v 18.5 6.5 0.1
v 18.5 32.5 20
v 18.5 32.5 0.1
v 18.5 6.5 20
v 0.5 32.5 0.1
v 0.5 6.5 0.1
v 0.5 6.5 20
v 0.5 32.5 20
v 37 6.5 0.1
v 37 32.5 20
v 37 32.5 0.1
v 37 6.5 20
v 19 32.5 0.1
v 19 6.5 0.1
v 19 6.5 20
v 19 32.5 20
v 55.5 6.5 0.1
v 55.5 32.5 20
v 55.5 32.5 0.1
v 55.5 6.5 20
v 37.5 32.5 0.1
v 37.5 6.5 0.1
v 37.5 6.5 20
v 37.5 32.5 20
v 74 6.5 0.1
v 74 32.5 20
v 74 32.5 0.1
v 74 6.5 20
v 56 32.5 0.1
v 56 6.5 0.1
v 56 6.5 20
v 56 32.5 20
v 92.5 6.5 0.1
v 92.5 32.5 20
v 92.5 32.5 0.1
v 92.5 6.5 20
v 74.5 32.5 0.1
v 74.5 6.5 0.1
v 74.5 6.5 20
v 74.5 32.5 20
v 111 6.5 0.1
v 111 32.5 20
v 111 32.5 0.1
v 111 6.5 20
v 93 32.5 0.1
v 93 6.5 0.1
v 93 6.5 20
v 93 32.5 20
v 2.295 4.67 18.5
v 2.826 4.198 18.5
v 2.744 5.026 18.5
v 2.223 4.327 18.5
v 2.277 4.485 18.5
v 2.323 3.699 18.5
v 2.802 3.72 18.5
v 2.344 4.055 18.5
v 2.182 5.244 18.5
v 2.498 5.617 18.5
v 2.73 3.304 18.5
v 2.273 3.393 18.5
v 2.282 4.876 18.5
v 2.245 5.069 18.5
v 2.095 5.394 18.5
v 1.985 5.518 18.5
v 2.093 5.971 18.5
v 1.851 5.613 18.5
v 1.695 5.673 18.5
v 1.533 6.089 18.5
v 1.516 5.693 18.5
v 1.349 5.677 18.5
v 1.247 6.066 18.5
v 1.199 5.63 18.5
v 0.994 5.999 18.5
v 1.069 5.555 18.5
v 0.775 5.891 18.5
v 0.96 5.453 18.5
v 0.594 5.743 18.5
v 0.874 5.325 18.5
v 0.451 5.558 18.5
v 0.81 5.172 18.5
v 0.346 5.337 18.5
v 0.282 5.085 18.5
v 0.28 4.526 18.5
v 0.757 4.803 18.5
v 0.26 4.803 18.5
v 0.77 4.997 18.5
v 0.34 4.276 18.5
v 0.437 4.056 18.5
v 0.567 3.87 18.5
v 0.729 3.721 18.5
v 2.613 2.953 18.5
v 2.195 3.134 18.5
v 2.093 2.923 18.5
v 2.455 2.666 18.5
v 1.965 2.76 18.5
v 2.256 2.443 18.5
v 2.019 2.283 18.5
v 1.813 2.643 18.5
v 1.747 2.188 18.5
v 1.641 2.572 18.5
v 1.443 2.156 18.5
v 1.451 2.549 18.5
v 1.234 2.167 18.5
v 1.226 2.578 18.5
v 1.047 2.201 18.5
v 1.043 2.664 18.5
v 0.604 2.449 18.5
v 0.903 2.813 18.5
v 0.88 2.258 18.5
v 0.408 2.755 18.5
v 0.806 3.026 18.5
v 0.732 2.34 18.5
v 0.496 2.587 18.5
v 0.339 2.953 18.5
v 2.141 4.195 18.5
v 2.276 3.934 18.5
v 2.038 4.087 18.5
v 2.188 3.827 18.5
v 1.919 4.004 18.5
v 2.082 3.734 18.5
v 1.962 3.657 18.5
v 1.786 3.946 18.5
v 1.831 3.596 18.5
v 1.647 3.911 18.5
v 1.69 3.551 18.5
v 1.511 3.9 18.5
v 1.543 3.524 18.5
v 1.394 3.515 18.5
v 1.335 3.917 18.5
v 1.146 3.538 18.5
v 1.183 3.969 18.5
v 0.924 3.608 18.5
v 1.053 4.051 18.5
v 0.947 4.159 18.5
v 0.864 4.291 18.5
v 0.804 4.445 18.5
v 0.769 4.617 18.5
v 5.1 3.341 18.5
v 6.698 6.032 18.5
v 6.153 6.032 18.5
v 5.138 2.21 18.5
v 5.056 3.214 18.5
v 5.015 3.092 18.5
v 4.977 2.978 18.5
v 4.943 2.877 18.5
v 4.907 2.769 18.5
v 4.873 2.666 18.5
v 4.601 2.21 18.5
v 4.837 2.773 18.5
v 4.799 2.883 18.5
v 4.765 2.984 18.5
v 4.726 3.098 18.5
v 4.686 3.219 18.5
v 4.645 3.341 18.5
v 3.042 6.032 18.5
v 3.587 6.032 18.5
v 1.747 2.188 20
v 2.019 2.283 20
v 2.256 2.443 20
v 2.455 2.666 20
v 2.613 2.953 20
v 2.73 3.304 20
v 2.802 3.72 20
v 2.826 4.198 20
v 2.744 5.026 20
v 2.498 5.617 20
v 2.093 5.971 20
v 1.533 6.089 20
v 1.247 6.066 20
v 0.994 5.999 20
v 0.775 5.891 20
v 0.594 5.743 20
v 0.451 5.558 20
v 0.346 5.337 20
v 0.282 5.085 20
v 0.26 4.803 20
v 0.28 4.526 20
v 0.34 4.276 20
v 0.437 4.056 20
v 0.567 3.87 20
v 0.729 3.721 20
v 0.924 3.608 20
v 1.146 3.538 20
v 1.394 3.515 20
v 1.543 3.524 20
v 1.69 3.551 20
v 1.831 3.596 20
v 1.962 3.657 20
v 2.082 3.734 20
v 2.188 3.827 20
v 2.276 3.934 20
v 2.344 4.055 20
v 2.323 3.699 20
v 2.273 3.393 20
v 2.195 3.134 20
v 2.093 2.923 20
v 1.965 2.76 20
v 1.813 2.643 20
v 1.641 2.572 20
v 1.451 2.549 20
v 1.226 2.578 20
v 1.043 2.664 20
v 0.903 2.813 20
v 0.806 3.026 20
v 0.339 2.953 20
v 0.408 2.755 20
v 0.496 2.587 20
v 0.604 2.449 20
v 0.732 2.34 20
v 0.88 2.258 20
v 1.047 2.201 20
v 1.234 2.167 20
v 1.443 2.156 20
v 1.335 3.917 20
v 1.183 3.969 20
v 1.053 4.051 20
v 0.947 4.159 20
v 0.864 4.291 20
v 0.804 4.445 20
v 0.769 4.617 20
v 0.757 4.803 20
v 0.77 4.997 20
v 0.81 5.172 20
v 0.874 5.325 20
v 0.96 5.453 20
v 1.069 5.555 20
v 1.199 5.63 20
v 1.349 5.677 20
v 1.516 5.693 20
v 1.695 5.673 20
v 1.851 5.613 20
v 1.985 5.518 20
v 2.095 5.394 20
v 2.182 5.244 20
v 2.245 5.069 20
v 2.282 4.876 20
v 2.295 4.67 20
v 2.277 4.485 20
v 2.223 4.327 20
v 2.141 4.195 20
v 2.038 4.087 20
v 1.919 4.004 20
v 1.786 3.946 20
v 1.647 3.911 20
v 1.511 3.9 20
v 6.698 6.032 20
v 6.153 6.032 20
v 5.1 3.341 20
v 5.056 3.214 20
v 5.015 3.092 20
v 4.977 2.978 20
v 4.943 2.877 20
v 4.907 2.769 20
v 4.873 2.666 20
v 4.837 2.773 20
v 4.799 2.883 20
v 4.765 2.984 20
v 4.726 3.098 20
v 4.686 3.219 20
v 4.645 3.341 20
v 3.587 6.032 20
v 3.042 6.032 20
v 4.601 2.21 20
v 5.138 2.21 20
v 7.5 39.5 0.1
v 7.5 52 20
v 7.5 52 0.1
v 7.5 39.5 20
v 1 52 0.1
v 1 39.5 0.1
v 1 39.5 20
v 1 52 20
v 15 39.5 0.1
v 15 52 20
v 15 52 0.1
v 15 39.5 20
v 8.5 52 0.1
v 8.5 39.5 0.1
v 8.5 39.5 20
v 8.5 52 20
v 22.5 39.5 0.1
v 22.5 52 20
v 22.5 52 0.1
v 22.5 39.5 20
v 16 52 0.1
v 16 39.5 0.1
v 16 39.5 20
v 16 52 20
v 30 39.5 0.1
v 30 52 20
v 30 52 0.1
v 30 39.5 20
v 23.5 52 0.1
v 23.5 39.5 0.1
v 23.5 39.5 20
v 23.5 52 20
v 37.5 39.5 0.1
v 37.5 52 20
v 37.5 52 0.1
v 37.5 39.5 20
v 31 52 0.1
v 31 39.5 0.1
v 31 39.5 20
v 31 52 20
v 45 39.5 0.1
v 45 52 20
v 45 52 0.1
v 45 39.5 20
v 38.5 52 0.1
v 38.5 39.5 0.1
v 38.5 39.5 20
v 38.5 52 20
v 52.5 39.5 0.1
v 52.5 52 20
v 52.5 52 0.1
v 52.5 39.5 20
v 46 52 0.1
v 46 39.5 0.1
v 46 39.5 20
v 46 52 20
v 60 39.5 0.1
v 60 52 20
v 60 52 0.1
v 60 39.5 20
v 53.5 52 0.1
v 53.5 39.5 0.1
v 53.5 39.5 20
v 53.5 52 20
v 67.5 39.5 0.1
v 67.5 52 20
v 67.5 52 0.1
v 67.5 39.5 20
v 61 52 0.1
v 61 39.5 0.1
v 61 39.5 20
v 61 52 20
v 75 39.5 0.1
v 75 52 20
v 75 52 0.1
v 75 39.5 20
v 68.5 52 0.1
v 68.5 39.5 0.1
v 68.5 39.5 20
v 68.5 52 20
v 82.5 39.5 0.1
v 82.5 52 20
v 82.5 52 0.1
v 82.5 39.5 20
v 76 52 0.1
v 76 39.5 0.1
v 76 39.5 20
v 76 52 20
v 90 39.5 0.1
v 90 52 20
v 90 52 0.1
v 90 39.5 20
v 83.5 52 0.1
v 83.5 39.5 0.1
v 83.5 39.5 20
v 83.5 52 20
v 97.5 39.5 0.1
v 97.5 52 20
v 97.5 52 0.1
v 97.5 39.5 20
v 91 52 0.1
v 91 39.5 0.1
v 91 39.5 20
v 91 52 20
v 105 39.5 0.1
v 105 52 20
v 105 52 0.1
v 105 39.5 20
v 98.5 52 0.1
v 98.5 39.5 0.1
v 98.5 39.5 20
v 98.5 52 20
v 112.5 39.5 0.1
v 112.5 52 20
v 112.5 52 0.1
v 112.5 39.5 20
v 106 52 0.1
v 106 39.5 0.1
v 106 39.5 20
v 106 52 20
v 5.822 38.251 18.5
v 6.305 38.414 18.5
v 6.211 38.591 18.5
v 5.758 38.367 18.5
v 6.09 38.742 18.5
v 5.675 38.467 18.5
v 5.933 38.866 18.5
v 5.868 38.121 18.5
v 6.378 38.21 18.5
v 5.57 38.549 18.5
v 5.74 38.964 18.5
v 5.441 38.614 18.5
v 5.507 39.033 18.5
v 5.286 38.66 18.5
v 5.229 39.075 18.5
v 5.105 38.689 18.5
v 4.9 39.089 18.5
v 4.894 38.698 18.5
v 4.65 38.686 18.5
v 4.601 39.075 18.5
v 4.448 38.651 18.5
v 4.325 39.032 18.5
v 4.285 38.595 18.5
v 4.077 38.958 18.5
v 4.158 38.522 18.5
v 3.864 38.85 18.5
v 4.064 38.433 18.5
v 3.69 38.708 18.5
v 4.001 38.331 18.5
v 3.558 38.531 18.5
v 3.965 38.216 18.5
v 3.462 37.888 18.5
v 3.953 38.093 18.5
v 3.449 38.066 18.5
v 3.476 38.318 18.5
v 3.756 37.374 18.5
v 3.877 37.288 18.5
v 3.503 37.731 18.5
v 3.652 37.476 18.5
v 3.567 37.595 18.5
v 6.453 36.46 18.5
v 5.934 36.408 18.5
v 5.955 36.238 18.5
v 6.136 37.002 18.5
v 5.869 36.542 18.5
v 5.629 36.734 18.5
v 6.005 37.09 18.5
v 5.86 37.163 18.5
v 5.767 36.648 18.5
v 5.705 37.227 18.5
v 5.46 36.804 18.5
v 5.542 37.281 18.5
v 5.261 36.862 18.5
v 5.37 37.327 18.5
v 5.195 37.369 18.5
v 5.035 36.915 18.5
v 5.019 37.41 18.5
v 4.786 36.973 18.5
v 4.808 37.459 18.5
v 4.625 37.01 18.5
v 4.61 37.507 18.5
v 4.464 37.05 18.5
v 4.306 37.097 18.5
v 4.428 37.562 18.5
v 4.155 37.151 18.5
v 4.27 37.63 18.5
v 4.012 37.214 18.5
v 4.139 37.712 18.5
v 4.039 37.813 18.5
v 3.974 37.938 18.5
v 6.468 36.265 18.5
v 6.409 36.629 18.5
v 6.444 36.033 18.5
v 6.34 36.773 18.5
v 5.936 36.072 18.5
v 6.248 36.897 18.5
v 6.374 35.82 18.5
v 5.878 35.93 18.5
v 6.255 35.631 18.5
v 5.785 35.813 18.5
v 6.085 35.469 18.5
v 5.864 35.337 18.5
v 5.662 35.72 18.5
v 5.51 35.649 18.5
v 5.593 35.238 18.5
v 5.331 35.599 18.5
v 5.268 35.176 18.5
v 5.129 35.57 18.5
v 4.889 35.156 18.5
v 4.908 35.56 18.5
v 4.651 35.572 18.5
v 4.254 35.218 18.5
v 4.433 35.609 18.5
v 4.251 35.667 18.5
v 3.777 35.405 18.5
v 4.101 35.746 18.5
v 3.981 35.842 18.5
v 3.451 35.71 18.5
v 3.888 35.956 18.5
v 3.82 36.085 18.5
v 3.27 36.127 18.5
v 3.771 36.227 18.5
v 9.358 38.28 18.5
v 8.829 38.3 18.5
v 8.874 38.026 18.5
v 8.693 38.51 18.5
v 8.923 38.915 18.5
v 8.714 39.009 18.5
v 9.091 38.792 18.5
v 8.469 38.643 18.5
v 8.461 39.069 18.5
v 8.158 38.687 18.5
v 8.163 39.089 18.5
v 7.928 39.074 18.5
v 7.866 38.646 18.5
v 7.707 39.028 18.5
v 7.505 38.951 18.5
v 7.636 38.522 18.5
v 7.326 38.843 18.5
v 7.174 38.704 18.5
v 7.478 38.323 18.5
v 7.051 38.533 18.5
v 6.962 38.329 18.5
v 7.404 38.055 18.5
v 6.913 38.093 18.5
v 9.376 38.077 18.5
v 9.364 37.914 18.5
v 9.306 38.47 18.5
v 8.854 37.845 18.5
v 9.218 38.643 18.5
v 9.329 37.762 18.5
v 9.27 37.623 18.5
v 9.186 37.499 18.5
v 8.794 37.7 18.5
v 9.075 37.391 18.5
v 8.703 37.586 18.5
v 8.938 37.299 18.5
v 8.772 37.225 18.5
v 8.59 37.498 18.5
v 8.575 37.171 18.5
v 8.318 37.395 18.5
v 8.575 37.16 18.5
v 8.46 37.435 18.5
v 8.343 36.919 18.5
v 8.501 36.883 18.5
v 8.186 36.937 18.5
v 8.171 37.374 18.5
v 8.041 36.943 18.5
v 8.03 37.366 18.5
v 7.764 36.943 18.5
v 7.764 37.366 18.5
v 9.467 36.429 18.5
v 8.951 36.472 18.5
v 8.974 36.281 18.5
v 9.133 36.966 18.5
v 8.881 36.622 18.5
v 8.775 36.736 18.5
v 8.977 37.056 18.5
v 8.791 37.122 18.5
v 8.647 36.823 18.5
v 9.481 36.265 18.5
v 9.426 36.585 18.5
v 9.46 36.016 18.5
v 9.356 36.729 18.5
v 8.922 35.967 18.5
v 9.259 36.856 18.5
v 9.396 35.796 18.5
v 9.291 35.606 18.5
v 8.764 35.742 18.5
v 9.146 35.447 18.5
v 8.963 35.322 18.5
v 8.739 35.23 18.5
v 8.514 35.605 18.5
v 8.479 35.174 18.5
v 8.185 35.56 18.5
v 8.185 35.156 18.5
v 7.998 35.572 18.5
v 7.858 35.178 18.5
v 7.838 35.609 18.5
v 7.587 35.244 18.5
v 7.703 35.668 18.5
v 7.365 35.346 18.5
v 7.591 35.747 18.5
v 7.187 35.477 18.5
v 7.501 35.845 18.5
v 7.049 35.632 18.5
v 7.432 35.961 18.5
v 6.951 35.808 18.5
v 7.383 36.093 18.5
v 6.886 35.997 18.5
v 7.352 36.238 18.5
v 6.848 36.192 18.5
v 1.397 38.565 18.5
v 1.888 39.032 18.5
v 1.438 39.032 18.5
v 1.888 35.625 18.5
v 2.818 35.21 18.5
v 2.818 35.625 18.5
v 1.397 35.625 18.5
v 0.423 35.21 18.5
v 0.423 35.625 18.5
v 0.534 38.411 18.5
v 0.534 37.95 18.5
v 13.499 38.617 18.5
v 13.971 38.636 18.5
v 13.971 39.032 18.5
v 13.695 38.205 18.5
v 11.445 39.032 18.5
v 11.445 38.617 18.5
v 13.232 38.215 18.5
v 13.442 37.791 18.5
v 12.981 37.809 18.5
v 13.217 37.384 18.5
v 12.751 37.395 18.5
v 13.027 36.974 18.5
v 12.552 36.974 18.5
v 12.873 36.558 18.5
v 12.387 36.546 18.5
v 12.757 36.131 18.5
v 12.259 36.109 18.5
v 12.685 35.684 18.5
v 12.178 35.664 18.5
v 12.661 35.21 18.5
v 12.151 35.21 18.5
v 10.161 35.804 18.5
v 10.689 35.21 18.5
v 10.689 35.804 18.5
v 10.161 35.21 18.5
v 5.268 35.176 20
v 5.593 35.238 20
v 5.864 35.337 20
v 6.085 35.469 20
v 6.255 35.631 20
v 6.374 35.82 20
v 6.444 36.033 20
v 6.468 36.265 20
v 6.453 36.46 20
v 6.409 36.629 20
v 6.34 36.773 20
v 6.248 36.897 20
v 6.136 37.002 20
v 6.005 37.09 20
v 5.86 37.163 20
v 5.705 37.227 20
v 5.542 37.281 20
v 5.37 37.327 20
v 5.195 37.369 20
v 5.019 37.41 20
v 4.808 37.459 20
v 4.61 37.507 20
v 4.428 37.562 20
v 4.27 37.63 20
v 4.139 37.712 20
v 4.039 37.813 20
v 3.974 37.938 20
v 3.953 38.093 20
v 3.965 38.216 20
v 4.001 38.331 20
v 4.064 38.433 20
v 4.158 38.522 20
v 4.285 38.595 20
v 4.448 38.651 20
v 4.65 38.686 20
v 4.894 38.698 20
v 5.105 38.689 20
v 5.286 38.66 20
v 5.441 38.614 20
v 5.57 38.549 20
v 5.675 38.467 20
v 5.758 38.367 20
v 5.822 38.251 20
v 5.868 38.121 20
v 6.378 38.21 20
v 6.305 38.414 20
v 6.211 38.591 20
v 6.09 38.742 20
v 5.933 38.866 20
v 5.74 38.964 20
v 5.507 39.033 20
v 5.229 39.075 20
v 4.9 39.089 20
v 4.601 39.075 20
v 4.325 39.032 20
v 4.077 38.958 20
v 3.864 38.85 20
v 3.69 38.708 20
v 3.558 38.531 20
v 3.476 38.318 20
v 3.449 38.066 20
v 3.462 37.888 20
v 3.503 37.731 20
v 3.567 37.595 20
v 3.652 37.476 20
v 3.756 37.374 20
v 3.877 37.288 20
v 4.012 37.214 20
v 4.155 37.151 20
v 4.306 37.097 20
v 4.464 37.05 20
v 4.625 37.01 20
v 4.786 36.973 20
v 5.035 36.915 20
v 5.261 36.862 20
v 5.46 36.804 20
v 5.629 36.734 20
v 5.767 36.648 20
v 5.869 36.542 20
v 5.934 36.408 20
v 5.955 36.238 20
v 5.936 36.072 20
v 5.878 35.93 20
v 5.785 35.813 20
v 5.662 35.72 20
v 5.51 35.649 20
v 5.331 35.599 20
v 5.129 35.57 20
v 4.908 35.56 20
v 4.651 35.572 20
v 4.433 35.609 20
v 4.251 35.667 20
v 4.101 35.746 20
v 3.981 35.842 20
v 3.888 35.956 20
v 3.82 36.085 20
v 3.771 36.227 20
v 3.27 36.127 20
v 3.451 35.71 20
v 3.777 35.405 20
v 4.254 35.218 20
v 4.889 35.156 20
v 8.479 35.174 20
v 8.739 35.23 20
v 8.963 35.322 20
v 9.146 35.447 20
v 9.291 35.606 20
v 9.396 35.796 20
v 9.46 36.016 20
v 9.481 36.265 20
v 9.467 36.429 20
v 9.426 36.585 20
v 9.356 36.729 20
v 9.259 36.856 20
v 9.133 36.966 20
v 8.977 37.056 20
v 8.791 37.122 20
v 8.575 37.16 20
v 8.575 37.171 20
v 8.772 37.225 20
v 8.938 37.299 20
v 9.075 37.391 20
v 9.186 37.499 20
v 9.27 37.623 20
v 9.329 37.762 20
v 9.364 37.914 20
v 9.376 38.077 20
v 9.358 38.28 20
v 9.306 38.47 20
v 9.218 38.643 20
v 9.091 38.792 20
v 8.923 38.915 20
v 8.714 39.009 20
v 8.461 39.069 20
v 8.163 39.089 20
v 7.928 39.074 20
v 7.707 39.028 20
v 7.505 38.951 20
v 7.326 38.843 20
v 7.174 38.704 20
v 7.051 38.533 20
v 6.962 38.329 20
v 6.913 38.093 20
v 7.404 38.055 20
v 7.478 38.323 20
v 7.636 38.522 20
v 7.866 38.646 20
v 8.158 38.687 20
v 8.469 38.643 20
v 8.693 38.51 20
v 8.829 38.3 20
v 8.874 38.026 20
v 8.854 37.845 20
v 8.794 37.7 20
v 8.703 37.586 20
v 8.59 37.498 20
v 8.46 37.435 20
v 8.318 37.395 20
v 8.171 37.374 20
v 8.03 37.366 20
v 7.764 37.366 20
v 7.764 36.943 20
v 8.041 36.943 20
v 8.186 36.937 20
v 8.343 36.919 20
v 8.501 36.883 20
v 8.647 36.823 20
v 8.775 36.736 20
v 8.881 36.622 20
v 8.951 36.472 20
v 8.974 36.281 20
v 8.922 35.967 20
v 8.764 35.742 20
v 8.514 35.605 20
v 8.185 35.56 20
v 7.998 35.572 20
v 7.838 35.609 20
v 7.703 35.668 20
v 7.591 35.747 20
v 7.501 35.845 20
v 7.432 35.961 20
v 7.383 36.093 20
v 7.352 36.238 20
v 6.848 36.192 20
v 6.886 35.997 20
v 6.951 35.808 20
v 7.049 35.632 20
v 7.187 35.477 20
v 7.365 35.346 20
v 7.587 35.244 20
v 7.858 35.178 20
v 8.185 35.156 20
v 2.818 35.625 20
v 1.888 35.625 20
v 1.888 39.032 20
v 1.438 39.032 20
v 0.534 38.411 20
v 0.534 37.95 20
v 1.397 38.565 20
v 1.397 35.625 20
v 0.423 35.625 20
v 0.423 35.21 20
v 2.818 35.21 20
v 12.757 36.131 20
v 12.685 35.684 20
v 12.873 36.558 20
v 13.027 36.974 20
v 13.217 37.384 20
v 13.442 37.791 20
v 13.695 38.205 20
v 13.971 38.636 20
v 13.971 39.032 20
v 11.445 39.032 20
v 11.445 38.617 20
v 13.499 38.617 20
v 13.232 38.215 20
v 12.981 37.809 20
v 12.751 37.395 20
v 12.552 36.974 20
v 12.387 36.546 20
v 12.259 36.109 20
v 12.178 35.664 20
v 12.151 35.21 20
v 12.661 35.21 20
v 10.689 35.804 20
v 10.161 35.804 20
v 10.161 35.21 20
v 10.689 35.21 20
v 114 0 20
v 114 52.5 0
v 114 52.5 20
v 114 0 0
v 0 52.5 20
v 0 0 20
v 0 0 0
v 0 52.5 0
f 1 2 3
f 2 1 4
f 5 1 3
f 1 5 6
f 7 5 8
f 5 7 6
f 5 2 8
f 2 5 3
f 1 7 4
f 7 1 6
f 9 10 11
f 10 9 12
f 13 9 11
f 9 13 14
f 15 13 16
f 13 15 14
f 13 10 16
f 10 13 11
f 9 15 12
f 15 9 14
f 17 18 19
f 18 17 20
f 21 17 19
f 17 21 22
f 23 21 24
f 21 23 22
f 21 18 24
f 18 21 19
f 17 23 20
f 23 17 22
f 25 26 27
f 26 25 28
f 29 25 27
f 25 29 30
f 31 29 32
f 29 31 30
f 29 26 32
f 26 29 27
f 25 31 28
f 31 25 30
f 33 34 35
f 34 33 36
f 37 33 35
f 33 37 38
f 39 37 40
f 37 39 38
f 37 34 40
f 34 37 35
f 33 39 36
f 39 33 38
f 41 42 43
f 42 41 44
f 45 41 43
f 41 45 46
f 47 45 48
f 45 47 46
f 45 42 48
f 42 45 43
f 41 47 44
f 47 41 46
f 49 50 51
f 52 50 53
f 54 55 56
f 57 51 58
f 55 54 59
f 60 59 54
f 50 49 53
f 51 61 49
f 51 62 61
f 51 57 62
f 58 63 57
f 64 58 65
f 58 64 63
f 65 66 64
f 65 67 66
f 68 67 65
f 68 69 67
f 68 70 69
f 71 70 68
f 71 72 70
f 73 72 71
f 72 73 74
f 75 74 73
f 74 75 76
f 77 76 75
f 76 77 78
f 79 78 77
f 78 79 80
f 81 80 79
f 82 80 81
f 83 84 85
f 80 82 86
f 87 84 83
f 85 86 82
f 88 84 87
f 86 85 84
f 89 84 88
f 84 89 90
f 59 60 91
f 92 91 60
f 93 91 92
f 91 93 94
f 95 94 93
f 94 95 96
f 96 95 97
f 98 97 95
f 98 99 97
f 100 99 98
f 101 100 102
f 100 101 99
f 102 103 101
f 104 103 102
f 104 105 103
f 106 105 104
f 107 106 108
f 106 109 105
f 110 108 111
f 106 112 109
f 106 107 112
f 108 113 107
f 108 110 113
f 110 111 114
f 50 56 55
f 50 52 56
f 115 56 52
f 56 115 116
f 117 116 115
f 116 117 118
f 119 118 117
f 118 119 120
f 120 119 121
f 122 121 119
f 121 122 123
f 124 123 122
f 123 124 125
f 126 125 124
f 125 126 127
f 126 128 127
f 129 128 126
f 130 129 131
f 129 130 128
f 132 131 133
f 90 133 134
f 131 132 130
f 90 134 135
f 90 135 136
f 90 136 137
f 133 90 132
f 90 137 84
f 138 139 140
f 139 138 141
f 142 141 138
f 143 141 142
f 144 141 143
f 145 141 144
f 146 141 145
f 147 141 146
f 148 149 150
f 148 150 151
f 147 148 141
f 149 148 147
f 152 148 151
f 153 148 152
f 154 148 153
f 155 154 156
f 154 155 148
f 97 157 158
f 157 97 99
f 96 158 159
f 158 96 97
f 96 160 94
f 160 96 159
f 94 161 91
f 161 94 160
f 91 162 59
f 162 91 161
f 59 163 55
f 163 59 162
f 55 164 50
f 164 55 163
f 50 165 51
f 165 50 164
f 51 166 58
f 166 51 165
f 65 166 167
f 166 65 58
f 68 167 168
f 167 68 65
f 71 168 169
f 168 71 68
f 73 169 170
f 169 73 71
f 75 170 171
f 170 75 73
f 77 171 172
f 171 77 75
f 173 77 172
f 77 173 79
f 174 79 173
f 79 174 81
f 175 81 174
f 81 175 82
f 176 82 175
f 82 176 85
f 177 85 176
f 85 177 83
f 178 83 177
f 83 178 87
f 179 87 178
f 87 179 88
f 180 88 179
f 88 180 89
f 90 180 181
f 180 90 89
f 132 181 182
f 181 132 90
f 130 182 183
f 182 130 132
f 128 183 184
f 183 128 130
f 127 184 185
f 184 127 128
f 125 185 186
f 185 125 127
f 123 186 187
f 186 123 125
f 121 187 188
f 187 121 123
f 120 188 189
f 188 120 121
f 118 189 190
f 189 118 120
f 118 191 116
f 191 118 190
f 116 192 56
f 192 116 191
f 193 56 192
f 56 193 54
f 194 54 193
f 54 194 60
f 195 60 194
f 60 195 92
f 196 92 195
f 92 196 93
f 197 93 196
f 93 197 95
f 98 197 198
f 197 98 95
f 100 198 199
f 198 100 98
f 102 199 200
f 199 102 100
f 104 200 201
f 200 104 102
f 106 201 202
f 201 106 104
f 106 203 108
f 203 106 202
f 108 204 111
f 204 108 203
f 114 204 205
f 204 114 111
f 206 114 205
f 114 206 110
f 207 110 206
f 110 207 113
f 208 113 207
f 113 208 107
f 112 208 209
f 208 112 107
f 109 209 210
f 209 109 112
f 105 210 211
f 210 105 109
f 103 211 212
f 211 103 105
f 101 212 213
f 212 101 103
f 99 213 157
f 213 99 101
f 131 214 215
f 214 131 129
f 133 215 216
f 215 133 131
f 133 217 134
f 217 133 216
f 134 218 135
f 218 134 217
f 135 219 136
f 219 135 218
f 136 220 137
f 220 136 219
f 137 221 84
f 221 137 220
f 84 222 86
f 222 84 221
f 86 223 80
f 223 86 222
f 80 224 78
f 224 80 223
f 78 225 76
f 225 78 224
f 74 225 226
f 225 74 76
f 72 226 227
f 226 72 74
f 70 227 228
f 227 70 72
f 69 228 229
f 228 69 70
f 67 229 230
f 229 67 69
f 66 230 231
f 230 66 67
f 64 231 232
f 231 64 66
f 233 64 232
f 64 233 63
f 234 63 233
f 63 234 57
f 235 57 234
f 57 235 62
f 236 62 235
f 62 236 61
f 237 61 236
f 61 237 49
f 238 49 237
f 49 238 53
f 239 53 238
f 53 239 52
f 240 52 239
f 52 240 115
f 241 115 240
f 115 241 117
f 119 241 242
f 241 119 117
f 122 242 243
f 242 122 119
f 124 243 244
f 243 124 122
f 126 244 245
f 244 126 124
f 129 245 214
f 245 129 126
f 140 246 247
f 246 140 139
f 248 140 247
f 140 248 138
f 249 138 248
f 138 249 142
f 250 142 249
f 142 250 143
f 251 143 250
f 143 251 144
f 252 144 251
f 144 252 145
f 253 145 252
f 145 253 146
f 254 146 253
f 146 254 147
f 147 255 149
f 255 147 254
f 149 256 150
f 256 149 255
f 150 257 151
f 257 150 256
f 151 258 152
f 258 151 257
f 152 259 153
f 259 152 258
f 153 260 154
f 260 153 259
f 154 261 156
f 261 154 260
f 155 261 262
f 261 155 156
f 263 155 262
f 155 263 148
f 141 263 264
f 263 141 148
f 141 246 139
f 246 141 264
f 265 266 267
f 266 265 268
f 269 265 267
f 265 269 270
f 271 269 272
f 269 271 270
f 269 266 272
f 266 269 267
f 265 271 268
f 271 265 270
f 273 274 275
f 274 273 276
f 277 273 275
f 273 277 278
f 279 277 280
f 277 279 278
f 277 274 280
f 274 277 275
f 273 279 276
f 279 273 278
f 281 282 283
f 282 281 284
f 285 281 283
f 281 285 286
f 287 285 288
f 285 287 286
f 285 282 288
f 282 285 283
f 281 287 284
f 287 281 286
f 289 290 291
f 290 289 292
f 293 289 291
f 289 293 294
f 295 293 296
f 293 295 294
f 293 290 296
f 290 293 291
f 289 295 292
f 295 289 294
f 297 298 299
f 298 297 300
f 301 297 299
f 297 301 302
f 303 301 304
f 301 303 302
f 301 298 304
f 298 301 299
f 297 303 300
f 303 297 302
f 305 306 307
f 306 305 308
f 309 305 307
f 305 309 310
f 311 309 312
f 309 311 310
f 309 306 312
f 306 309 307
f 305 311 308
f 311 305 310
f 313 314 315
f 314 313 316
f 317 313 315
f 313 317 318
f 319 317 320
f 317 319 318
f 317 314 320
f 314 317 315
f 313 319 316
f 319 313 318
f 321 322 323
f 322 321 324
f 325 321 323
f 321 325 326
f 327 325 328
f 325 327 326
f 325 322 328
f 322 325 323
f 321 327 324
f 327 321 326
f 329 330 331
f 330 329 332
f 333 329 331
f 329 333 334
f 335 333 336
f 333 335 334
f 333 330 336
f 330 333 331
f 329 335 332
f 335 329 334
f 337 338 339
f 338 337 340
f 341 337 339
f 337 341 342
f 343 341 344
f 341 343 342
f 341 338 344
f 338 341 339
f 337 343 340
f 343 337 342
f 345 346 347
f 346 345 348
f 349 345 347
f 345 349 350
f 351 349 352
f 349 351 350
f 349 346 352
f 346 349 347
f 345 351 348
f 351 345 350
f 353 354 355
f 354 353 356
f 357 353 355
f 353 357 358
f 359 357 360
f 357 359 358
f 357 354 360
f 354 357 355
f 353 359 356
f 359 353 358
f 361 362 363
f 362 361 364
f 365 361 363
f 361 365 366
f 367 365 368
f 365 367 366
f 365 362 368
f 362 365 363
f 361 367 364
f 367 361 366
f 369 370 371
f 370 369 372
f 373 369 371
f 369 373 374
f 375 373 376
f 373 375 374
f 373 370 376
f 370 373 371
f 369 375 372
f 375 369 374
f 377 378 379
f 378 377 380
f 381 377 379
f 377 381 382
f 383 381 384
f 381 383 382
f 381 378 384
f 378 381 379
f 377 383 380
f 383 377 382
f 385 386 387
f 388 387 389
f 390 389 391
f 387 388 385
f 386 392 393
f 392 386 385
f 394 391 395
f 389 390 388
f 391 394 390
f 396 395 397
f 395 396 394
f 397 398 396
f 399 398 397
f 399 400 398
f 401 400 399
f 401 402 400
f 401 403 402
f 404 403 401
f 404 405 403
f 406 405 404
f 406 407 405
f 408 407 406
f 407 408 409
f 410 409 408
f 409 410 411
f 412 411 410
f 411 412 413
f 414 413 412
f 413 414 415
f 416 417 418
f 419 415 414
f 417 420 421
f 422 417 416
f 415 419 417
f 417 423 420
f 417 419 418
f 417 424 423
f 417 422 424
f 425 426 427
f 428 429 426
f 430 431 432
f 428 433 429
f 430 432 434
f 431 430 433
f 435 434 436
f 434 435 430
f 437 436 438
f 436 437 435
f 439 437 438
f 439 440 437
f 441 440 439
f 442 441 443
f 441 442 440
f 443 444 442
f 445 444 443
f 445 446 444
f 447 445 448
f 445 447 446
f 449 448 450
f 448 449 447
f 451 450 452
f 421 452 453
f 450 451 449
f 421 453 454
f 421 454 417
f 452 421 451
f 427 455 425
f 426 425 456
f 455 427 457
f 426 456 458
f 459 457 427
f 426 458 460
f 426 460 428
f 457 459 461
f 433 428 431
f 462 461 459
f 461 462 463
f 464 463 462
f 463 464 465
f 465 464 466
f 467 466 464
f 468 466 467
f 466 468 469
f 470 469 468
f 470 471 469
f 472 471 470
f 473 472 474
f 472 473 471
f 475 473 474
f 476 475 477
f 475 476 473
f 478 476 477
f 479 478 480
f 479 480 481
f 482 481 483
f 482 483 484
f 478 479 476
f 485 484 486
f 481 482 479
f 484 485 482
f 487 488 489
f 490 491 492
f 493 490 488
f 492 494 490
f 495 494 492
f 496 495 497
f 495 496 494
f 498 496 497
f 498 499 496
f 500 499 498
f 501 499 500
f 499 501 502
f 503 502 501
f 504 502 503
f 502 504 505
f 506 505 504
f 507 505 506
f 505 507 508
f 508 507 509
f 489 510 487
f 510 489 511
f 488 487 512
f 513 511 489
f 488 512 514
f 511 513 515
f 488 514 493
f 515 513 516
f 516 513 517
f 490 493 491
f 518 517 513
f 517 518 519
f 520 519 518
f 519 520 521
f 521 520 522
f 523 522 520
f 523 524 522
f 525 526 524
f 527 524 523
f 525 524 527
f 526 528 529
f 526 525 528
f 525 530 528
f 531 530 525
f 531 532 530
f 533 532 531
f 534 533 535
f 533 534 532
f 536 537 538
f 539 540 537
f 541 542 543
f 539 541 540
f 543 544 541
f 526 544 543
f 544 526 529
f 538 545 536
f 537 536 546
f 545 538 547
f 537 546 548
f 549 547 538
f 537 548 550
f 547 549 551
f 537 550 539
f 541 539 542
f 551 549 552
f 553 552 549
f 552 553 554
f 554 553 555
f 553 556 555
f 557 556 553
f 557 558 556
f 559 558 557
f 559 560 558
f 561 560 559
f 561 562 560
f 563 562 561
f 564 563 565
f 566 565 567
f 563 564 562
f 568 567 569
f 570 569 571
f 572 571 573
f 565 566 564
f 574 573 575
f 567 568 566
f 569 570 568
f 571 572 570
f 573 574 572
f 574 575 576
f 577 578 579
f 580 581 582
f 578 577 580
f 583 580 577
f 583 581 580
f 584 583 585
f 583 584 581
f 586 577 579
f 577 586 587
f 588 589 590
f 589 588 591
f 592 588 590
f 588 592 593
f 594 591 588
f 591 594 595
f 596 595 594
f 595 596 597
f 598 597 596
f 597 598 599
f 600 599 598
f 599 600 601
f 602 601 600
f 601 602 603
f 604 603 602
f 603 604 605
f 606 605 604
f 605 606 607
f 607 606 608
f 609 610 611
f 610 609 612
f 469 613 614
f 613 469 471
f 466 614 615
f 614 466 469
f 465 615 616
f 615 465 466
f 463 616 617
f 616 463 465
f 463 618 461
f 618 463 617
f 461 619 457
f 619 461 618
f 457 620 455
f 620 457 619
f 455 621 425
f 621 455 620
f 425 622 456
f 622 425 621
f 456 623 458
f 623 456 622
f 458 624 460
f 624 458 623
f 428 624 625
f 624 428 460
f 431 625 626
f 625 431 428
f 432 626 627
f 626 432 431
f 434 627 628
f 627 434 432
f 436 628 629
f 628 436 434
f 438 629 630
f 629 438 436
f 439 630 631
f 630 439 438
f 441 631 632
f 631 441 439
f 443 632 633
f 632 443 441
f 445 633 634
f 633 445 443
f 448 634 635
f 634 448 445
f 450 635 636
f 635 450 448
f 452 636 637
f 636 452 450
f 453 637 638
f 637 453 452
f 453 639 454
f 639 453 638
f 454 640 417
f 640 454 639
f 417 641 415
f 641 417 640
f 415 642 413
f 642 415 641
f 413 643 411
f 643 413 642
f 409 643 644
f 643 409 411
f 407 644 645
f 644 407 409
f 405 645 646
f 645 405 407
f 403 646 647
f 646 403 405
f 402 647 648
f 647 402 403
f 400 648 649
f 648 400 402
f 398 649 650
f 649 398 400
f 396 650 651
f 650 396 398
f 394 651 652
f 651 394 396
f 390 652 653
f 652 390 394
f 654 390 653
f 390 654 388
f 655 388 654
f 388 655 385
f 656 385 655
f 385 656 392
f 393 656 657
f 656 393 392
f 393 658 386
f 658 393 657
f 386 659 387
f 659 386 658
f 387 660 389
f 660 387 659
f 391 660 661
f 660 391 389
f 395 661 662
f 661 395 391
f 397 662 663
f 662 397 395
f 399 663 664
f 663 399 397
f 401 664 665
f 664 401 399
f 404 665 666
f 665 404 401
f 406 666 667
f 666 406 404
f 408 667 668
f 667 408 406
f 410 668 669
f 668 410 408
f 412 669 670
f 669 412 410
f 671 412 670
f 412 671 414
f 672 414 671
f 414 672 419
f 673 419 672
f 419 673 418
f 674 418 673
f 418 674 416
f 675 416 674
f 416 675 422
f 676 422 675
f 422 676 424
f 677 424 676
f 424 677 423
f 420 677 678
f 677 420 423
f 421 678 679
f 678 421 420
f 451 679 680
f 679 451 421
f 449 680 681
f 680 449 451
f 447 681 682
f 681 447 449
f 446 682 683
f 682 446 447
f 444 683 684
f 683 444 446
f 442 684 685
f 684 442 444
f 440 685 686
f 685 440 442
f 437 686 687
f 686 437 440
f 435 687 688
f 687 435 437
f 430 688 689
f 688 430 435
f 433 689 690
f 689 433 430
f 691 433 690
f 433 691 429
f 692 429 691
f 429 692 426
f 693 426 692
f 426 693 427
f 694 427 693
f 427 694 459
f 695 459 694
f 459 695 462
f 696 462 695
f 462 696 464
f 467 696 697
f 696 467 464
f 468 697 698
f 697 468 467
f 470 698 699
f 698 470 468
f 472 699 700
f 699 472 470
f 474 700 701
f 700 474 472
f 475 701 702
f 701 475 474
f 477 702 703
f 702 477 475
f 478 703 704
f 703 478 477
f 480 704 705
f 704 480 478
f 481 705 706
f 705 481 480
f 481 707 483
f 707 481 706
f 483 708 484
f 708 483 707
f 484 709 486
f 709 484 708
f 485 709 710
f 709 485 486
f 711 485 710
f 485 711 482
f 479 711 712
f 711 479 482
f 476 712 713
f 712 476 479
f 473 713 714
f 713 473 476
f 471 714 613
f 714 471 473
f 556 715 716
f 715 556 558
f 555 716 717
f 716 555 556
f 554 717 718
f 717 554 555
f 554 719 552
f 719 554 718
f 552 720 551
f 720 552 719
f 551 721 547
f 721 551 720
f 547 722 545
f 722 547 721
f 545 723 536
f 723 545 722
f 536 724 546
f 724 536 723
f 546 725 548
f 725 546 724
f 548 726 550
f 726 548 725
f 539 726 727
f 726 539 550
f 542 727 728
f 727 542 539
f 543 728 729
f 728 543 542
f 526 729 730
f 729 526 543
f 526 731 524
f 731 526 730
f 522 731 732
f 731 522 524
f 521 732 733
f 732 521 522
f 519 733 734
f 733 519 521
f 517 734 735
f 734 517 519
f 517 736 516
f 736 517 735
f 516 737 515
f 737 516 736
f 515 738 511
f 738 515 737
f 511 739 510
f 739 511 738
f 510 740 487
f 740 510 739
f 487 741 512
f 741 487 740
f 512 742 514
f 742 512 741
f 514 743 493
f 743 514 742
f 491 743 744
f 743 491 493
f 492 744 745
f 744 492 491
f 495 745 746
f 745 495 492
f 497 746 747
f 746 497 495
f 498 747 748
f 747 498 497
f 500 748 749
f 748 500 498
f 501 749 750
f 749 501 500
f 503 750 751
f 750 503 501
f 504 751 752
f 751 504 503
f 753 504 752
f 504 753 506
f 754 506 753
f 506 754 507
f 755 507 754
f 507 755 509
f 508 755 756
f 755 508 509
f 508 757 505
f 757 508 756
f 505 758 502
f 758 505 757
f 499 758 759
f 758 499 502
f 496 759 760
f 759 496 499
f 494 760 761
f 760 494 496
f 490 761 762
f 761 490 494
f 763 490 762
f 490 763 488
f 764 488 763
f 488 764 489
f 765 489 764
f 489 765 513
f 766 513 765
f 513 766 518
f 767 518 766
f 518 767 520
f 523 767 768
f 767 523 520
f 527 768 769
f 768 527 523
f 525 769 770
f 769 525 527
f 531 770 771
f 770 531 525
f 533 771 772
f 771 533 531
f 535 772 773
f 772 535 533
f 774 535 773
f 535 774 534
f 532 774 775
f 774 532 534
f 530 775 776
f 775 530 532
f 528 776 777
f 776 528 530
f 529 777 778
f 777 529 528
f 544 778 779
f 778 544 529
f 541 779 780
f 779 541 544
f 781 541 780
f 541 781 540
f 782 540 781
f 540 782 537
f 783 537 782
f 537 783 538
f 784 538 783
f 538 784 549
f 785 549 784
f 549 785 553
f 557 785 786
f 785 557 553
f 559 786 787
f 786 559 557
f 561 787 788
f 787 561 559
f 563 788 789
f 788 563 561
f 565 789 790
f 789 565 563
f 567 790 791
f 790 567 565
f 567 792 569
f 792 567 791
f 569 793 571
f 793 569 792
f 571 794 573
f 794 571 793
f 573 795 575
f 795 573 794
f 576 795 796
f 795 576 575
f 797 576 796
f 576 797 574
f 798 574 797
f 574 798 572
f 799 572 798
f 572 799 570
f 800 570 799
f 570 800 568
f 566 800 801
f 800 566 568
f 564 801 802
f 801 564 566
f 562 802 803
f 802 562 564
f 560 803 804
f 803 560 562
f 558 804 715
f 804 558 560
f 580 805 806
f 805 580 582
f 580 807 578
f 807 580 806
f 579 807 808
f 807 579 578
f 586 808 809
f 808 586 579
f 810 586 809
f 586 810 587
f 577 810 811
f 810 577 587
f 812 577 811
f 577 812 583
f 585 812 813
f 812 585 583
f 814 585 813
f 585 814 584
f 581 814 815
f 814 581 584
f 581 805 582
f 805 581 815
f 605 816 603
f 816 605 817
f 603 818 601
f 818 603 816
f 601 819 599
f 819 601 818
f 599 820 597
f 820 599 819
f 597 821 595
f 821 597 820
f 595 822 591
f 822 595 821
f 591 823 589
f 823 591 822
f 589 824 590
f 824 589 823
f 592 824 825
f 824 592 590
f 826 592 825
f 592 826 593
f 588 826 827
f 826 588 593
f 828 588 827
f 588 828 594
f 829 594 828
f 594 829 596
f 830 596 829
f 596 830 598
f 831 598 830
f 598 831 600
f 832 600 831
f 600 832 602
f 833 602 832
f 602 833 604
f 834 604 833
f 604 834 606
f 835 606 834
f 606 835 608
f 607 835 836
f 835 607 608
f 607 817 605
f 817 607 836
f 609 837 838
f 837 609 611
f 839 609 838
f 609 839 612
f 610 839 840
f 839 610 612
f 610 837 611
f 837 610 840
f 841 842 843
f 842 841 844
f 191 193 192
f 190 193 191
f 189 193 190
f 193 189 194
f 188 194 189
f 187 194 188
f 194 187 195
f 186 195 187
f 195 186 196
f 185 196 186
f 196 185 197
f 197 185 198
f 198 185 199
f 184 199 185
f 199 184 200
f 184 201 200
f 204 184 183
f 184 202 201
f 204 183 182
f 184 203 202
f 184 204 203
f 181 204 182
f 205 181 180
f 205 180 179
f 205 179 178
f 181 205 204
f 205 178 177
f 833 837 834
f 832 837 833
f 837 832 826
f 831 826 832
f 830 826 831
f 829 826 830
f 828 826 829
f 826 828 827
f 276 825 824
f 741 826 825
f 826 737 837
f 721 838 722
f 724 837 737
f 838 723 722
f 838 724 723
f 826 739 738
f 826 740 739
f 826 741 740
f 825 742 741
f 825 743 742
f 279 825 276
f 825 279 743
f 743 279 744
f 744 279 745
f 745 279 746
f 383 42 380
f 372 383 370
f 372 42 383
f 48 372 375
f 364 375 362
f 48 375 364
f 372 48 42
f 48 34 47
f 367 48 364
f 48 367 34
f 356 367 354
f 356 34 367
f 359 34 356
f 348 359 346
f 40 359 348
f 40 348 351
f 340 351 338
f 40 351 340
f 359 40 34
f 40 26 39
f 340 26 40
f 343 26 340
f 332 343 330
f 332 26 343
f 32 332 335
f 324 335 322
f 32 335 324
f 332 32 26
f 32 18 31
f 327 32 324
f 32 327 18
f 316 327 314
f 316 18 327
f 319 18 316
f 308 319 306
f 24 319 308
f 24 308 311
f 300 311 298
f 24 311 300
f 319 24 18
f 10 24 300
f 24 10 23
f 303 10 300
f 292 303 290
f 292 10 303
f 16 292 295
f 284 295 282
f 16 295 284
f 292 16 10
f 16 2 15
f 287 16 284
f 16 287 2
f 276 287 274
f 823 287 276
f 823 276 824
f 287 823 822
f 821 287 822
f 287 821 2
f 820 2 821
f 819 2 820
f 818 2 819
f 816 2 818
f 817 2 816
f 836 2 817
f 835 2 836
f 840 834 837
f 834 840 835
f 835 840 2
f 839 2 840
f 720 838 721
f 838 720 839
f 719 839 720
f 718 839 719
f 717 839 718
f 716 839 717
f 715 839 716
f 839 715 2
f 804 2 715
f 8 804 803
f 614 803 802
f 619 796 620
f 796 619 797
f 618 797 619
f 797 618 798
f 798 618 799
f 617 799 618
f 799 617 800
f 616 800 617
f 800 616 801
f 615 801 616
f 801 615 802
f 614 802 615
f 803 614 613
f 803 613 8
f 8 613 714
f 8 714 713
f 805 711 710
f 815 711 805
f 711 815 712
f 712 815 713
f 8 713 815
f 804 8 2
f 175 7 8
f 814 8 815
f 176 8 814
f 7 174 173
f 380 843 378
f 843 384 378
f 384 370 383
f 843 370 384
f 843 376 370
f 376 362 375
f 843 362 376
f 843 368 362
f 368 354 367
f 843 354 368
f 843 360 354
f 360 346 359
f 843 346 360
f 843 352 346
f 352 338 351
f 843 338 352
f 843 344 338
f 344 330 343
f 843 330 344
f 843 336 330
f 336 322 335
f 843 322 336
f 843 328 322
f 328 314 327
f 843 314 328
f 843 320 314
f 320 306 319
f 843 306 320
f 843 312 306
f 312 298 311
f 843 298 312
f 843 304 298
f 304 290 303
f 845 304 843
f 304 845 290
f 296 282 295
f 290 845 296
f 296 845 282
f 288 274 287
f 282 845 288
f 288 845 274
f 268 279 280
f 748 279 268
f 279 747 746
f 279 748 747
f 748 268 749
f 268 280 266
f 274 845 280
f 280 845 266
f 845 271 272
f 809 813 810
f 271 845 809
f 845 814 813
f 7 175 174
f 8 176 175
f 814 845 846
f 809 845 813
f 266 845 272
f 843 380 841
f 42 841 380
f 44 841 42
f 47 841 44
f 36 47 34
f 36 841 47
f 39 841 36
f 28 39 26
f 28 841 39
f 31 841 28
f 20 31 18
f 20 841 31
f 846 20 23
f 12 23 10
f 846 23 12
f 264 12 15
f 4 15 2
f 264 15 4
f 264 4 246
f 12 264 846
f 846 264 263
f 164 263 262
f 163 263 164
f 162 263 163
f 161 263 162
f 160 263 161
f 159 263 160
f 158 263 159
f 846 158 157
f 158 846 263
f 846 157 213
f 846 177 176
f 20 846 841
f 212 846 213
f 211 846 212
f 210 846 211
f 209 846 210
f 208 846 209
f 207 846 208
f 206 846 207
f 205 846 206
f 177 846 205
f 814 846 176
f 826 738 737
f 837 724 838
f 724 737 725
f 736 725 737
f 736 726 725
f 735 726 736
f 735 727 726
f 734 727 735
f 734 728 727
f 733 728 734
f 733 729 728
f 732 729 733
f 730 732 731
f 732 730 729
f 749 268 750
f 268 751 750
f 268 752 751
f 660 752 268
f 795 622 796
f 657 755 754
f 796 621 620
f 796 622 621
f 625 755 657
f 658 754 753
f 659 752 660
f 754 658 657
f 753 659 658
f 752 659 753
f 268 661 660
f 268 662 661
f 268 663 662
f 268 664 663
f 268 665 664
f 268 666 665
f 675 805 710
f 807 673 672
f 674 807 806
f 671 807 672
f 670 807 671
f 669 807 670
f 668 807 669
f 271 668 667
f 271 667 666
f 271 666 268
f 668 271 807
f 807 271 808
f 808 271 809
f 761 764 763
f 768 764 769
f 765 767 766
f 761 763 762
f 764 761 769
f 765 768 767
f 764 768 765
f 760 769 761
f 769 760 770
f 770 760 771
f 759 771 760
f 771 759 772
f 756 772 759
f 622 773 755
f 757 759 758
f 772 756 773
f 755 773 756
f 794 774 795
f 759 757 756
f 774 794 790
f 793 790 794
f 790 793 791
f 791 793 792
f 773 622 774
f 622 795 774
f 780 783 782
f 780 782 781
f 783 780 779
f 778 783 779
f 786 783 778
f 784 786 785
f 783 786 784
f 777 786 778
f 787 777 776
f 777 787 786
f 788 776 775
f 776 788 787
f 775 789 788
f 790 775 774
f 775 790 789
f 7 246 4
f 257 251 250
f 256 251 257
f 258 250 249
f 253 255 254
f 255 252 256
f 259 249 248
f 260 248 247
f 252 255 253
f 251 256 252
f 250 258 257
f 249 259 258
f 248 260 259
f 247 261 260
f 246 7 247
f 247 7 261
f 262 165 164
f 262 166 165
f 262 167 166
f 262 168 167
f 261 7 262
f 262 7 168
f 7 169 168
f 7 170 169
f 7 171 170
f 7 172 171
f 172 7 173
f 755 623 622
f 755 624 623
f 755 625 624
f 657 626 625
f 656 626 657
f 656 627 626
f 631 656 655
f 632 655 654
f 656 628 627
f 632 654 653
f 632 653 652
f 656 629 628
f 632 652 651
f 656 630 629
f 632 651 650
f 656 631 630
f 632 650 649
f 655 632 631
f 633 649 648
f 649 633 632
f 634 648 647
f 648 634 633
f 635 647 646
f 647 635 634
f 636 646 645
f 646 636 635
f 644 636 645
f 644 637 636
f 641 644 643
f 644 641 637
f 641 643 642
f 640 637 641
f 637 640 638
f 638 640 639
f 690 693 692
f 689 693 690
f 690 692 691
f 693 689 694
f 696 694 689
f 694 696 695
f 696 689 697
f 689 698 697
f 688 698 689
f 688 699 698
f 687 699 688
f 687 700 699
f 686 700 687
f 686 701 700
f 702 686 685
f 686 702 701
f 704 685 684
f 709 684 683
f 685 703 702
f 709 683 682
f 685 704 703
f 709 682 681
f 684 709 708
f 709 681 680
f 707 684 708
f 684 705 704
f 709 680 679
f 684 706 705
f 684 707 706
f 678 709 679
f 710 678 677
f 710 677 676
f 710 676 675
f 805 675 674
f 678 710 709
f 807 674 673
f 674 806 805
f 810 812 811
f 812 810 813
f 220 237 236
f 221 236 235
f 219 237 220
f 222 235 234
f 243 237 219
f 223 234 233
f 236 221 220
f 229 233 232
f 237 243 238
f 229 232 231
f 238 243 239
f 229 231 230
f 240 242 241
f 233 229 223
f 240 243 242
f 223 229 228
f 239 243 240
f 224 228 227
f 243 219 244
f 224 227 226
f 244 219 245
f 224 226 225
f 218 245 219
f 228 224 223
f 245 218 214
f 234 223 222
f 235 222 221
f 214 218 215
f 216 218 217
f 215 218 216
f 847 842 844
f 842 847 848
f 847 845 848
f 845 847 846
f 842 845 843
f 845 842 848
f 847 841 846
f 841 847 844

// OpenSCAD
// název, díra, obvod
batteries=[
["9V",[18,26,20],[18.5,26.5]],
["1S3.7",[6.5,12.5,20],[7.5,13]]
];

width=114;

space = 7;

function height(i) = batteries[i][1][1] + space + ( i>0 ? height(i-1) : 0 );

function maxsize(i) = max(batteries[i][1][2], (i>0 ? maxsize(i-1) : 0));

module row(battery) {
    translate([0,space-battery[2][1]+battery[1][1],-1.5]) linear_extrude(3) text(battery[0], size=space-3, valign="top");
    for(i=[0:(battery[2][0]):(width-battery[2][0])]){
        translate([i+battery[2][0]-battery[1][0],space,-battery[1][2]+.1]) cube(battery[1]);
    }
}

difference() {
    height = maxsize(len(batteries)-1);
    cube([width, height(len(batteries)-1), height]);
    for (i = [0:len(batteries)-1]) {
        battery = batteries[i];
        translate([0, height(i)-battery[2][1]-space, height])  row(battery);
    }
}
